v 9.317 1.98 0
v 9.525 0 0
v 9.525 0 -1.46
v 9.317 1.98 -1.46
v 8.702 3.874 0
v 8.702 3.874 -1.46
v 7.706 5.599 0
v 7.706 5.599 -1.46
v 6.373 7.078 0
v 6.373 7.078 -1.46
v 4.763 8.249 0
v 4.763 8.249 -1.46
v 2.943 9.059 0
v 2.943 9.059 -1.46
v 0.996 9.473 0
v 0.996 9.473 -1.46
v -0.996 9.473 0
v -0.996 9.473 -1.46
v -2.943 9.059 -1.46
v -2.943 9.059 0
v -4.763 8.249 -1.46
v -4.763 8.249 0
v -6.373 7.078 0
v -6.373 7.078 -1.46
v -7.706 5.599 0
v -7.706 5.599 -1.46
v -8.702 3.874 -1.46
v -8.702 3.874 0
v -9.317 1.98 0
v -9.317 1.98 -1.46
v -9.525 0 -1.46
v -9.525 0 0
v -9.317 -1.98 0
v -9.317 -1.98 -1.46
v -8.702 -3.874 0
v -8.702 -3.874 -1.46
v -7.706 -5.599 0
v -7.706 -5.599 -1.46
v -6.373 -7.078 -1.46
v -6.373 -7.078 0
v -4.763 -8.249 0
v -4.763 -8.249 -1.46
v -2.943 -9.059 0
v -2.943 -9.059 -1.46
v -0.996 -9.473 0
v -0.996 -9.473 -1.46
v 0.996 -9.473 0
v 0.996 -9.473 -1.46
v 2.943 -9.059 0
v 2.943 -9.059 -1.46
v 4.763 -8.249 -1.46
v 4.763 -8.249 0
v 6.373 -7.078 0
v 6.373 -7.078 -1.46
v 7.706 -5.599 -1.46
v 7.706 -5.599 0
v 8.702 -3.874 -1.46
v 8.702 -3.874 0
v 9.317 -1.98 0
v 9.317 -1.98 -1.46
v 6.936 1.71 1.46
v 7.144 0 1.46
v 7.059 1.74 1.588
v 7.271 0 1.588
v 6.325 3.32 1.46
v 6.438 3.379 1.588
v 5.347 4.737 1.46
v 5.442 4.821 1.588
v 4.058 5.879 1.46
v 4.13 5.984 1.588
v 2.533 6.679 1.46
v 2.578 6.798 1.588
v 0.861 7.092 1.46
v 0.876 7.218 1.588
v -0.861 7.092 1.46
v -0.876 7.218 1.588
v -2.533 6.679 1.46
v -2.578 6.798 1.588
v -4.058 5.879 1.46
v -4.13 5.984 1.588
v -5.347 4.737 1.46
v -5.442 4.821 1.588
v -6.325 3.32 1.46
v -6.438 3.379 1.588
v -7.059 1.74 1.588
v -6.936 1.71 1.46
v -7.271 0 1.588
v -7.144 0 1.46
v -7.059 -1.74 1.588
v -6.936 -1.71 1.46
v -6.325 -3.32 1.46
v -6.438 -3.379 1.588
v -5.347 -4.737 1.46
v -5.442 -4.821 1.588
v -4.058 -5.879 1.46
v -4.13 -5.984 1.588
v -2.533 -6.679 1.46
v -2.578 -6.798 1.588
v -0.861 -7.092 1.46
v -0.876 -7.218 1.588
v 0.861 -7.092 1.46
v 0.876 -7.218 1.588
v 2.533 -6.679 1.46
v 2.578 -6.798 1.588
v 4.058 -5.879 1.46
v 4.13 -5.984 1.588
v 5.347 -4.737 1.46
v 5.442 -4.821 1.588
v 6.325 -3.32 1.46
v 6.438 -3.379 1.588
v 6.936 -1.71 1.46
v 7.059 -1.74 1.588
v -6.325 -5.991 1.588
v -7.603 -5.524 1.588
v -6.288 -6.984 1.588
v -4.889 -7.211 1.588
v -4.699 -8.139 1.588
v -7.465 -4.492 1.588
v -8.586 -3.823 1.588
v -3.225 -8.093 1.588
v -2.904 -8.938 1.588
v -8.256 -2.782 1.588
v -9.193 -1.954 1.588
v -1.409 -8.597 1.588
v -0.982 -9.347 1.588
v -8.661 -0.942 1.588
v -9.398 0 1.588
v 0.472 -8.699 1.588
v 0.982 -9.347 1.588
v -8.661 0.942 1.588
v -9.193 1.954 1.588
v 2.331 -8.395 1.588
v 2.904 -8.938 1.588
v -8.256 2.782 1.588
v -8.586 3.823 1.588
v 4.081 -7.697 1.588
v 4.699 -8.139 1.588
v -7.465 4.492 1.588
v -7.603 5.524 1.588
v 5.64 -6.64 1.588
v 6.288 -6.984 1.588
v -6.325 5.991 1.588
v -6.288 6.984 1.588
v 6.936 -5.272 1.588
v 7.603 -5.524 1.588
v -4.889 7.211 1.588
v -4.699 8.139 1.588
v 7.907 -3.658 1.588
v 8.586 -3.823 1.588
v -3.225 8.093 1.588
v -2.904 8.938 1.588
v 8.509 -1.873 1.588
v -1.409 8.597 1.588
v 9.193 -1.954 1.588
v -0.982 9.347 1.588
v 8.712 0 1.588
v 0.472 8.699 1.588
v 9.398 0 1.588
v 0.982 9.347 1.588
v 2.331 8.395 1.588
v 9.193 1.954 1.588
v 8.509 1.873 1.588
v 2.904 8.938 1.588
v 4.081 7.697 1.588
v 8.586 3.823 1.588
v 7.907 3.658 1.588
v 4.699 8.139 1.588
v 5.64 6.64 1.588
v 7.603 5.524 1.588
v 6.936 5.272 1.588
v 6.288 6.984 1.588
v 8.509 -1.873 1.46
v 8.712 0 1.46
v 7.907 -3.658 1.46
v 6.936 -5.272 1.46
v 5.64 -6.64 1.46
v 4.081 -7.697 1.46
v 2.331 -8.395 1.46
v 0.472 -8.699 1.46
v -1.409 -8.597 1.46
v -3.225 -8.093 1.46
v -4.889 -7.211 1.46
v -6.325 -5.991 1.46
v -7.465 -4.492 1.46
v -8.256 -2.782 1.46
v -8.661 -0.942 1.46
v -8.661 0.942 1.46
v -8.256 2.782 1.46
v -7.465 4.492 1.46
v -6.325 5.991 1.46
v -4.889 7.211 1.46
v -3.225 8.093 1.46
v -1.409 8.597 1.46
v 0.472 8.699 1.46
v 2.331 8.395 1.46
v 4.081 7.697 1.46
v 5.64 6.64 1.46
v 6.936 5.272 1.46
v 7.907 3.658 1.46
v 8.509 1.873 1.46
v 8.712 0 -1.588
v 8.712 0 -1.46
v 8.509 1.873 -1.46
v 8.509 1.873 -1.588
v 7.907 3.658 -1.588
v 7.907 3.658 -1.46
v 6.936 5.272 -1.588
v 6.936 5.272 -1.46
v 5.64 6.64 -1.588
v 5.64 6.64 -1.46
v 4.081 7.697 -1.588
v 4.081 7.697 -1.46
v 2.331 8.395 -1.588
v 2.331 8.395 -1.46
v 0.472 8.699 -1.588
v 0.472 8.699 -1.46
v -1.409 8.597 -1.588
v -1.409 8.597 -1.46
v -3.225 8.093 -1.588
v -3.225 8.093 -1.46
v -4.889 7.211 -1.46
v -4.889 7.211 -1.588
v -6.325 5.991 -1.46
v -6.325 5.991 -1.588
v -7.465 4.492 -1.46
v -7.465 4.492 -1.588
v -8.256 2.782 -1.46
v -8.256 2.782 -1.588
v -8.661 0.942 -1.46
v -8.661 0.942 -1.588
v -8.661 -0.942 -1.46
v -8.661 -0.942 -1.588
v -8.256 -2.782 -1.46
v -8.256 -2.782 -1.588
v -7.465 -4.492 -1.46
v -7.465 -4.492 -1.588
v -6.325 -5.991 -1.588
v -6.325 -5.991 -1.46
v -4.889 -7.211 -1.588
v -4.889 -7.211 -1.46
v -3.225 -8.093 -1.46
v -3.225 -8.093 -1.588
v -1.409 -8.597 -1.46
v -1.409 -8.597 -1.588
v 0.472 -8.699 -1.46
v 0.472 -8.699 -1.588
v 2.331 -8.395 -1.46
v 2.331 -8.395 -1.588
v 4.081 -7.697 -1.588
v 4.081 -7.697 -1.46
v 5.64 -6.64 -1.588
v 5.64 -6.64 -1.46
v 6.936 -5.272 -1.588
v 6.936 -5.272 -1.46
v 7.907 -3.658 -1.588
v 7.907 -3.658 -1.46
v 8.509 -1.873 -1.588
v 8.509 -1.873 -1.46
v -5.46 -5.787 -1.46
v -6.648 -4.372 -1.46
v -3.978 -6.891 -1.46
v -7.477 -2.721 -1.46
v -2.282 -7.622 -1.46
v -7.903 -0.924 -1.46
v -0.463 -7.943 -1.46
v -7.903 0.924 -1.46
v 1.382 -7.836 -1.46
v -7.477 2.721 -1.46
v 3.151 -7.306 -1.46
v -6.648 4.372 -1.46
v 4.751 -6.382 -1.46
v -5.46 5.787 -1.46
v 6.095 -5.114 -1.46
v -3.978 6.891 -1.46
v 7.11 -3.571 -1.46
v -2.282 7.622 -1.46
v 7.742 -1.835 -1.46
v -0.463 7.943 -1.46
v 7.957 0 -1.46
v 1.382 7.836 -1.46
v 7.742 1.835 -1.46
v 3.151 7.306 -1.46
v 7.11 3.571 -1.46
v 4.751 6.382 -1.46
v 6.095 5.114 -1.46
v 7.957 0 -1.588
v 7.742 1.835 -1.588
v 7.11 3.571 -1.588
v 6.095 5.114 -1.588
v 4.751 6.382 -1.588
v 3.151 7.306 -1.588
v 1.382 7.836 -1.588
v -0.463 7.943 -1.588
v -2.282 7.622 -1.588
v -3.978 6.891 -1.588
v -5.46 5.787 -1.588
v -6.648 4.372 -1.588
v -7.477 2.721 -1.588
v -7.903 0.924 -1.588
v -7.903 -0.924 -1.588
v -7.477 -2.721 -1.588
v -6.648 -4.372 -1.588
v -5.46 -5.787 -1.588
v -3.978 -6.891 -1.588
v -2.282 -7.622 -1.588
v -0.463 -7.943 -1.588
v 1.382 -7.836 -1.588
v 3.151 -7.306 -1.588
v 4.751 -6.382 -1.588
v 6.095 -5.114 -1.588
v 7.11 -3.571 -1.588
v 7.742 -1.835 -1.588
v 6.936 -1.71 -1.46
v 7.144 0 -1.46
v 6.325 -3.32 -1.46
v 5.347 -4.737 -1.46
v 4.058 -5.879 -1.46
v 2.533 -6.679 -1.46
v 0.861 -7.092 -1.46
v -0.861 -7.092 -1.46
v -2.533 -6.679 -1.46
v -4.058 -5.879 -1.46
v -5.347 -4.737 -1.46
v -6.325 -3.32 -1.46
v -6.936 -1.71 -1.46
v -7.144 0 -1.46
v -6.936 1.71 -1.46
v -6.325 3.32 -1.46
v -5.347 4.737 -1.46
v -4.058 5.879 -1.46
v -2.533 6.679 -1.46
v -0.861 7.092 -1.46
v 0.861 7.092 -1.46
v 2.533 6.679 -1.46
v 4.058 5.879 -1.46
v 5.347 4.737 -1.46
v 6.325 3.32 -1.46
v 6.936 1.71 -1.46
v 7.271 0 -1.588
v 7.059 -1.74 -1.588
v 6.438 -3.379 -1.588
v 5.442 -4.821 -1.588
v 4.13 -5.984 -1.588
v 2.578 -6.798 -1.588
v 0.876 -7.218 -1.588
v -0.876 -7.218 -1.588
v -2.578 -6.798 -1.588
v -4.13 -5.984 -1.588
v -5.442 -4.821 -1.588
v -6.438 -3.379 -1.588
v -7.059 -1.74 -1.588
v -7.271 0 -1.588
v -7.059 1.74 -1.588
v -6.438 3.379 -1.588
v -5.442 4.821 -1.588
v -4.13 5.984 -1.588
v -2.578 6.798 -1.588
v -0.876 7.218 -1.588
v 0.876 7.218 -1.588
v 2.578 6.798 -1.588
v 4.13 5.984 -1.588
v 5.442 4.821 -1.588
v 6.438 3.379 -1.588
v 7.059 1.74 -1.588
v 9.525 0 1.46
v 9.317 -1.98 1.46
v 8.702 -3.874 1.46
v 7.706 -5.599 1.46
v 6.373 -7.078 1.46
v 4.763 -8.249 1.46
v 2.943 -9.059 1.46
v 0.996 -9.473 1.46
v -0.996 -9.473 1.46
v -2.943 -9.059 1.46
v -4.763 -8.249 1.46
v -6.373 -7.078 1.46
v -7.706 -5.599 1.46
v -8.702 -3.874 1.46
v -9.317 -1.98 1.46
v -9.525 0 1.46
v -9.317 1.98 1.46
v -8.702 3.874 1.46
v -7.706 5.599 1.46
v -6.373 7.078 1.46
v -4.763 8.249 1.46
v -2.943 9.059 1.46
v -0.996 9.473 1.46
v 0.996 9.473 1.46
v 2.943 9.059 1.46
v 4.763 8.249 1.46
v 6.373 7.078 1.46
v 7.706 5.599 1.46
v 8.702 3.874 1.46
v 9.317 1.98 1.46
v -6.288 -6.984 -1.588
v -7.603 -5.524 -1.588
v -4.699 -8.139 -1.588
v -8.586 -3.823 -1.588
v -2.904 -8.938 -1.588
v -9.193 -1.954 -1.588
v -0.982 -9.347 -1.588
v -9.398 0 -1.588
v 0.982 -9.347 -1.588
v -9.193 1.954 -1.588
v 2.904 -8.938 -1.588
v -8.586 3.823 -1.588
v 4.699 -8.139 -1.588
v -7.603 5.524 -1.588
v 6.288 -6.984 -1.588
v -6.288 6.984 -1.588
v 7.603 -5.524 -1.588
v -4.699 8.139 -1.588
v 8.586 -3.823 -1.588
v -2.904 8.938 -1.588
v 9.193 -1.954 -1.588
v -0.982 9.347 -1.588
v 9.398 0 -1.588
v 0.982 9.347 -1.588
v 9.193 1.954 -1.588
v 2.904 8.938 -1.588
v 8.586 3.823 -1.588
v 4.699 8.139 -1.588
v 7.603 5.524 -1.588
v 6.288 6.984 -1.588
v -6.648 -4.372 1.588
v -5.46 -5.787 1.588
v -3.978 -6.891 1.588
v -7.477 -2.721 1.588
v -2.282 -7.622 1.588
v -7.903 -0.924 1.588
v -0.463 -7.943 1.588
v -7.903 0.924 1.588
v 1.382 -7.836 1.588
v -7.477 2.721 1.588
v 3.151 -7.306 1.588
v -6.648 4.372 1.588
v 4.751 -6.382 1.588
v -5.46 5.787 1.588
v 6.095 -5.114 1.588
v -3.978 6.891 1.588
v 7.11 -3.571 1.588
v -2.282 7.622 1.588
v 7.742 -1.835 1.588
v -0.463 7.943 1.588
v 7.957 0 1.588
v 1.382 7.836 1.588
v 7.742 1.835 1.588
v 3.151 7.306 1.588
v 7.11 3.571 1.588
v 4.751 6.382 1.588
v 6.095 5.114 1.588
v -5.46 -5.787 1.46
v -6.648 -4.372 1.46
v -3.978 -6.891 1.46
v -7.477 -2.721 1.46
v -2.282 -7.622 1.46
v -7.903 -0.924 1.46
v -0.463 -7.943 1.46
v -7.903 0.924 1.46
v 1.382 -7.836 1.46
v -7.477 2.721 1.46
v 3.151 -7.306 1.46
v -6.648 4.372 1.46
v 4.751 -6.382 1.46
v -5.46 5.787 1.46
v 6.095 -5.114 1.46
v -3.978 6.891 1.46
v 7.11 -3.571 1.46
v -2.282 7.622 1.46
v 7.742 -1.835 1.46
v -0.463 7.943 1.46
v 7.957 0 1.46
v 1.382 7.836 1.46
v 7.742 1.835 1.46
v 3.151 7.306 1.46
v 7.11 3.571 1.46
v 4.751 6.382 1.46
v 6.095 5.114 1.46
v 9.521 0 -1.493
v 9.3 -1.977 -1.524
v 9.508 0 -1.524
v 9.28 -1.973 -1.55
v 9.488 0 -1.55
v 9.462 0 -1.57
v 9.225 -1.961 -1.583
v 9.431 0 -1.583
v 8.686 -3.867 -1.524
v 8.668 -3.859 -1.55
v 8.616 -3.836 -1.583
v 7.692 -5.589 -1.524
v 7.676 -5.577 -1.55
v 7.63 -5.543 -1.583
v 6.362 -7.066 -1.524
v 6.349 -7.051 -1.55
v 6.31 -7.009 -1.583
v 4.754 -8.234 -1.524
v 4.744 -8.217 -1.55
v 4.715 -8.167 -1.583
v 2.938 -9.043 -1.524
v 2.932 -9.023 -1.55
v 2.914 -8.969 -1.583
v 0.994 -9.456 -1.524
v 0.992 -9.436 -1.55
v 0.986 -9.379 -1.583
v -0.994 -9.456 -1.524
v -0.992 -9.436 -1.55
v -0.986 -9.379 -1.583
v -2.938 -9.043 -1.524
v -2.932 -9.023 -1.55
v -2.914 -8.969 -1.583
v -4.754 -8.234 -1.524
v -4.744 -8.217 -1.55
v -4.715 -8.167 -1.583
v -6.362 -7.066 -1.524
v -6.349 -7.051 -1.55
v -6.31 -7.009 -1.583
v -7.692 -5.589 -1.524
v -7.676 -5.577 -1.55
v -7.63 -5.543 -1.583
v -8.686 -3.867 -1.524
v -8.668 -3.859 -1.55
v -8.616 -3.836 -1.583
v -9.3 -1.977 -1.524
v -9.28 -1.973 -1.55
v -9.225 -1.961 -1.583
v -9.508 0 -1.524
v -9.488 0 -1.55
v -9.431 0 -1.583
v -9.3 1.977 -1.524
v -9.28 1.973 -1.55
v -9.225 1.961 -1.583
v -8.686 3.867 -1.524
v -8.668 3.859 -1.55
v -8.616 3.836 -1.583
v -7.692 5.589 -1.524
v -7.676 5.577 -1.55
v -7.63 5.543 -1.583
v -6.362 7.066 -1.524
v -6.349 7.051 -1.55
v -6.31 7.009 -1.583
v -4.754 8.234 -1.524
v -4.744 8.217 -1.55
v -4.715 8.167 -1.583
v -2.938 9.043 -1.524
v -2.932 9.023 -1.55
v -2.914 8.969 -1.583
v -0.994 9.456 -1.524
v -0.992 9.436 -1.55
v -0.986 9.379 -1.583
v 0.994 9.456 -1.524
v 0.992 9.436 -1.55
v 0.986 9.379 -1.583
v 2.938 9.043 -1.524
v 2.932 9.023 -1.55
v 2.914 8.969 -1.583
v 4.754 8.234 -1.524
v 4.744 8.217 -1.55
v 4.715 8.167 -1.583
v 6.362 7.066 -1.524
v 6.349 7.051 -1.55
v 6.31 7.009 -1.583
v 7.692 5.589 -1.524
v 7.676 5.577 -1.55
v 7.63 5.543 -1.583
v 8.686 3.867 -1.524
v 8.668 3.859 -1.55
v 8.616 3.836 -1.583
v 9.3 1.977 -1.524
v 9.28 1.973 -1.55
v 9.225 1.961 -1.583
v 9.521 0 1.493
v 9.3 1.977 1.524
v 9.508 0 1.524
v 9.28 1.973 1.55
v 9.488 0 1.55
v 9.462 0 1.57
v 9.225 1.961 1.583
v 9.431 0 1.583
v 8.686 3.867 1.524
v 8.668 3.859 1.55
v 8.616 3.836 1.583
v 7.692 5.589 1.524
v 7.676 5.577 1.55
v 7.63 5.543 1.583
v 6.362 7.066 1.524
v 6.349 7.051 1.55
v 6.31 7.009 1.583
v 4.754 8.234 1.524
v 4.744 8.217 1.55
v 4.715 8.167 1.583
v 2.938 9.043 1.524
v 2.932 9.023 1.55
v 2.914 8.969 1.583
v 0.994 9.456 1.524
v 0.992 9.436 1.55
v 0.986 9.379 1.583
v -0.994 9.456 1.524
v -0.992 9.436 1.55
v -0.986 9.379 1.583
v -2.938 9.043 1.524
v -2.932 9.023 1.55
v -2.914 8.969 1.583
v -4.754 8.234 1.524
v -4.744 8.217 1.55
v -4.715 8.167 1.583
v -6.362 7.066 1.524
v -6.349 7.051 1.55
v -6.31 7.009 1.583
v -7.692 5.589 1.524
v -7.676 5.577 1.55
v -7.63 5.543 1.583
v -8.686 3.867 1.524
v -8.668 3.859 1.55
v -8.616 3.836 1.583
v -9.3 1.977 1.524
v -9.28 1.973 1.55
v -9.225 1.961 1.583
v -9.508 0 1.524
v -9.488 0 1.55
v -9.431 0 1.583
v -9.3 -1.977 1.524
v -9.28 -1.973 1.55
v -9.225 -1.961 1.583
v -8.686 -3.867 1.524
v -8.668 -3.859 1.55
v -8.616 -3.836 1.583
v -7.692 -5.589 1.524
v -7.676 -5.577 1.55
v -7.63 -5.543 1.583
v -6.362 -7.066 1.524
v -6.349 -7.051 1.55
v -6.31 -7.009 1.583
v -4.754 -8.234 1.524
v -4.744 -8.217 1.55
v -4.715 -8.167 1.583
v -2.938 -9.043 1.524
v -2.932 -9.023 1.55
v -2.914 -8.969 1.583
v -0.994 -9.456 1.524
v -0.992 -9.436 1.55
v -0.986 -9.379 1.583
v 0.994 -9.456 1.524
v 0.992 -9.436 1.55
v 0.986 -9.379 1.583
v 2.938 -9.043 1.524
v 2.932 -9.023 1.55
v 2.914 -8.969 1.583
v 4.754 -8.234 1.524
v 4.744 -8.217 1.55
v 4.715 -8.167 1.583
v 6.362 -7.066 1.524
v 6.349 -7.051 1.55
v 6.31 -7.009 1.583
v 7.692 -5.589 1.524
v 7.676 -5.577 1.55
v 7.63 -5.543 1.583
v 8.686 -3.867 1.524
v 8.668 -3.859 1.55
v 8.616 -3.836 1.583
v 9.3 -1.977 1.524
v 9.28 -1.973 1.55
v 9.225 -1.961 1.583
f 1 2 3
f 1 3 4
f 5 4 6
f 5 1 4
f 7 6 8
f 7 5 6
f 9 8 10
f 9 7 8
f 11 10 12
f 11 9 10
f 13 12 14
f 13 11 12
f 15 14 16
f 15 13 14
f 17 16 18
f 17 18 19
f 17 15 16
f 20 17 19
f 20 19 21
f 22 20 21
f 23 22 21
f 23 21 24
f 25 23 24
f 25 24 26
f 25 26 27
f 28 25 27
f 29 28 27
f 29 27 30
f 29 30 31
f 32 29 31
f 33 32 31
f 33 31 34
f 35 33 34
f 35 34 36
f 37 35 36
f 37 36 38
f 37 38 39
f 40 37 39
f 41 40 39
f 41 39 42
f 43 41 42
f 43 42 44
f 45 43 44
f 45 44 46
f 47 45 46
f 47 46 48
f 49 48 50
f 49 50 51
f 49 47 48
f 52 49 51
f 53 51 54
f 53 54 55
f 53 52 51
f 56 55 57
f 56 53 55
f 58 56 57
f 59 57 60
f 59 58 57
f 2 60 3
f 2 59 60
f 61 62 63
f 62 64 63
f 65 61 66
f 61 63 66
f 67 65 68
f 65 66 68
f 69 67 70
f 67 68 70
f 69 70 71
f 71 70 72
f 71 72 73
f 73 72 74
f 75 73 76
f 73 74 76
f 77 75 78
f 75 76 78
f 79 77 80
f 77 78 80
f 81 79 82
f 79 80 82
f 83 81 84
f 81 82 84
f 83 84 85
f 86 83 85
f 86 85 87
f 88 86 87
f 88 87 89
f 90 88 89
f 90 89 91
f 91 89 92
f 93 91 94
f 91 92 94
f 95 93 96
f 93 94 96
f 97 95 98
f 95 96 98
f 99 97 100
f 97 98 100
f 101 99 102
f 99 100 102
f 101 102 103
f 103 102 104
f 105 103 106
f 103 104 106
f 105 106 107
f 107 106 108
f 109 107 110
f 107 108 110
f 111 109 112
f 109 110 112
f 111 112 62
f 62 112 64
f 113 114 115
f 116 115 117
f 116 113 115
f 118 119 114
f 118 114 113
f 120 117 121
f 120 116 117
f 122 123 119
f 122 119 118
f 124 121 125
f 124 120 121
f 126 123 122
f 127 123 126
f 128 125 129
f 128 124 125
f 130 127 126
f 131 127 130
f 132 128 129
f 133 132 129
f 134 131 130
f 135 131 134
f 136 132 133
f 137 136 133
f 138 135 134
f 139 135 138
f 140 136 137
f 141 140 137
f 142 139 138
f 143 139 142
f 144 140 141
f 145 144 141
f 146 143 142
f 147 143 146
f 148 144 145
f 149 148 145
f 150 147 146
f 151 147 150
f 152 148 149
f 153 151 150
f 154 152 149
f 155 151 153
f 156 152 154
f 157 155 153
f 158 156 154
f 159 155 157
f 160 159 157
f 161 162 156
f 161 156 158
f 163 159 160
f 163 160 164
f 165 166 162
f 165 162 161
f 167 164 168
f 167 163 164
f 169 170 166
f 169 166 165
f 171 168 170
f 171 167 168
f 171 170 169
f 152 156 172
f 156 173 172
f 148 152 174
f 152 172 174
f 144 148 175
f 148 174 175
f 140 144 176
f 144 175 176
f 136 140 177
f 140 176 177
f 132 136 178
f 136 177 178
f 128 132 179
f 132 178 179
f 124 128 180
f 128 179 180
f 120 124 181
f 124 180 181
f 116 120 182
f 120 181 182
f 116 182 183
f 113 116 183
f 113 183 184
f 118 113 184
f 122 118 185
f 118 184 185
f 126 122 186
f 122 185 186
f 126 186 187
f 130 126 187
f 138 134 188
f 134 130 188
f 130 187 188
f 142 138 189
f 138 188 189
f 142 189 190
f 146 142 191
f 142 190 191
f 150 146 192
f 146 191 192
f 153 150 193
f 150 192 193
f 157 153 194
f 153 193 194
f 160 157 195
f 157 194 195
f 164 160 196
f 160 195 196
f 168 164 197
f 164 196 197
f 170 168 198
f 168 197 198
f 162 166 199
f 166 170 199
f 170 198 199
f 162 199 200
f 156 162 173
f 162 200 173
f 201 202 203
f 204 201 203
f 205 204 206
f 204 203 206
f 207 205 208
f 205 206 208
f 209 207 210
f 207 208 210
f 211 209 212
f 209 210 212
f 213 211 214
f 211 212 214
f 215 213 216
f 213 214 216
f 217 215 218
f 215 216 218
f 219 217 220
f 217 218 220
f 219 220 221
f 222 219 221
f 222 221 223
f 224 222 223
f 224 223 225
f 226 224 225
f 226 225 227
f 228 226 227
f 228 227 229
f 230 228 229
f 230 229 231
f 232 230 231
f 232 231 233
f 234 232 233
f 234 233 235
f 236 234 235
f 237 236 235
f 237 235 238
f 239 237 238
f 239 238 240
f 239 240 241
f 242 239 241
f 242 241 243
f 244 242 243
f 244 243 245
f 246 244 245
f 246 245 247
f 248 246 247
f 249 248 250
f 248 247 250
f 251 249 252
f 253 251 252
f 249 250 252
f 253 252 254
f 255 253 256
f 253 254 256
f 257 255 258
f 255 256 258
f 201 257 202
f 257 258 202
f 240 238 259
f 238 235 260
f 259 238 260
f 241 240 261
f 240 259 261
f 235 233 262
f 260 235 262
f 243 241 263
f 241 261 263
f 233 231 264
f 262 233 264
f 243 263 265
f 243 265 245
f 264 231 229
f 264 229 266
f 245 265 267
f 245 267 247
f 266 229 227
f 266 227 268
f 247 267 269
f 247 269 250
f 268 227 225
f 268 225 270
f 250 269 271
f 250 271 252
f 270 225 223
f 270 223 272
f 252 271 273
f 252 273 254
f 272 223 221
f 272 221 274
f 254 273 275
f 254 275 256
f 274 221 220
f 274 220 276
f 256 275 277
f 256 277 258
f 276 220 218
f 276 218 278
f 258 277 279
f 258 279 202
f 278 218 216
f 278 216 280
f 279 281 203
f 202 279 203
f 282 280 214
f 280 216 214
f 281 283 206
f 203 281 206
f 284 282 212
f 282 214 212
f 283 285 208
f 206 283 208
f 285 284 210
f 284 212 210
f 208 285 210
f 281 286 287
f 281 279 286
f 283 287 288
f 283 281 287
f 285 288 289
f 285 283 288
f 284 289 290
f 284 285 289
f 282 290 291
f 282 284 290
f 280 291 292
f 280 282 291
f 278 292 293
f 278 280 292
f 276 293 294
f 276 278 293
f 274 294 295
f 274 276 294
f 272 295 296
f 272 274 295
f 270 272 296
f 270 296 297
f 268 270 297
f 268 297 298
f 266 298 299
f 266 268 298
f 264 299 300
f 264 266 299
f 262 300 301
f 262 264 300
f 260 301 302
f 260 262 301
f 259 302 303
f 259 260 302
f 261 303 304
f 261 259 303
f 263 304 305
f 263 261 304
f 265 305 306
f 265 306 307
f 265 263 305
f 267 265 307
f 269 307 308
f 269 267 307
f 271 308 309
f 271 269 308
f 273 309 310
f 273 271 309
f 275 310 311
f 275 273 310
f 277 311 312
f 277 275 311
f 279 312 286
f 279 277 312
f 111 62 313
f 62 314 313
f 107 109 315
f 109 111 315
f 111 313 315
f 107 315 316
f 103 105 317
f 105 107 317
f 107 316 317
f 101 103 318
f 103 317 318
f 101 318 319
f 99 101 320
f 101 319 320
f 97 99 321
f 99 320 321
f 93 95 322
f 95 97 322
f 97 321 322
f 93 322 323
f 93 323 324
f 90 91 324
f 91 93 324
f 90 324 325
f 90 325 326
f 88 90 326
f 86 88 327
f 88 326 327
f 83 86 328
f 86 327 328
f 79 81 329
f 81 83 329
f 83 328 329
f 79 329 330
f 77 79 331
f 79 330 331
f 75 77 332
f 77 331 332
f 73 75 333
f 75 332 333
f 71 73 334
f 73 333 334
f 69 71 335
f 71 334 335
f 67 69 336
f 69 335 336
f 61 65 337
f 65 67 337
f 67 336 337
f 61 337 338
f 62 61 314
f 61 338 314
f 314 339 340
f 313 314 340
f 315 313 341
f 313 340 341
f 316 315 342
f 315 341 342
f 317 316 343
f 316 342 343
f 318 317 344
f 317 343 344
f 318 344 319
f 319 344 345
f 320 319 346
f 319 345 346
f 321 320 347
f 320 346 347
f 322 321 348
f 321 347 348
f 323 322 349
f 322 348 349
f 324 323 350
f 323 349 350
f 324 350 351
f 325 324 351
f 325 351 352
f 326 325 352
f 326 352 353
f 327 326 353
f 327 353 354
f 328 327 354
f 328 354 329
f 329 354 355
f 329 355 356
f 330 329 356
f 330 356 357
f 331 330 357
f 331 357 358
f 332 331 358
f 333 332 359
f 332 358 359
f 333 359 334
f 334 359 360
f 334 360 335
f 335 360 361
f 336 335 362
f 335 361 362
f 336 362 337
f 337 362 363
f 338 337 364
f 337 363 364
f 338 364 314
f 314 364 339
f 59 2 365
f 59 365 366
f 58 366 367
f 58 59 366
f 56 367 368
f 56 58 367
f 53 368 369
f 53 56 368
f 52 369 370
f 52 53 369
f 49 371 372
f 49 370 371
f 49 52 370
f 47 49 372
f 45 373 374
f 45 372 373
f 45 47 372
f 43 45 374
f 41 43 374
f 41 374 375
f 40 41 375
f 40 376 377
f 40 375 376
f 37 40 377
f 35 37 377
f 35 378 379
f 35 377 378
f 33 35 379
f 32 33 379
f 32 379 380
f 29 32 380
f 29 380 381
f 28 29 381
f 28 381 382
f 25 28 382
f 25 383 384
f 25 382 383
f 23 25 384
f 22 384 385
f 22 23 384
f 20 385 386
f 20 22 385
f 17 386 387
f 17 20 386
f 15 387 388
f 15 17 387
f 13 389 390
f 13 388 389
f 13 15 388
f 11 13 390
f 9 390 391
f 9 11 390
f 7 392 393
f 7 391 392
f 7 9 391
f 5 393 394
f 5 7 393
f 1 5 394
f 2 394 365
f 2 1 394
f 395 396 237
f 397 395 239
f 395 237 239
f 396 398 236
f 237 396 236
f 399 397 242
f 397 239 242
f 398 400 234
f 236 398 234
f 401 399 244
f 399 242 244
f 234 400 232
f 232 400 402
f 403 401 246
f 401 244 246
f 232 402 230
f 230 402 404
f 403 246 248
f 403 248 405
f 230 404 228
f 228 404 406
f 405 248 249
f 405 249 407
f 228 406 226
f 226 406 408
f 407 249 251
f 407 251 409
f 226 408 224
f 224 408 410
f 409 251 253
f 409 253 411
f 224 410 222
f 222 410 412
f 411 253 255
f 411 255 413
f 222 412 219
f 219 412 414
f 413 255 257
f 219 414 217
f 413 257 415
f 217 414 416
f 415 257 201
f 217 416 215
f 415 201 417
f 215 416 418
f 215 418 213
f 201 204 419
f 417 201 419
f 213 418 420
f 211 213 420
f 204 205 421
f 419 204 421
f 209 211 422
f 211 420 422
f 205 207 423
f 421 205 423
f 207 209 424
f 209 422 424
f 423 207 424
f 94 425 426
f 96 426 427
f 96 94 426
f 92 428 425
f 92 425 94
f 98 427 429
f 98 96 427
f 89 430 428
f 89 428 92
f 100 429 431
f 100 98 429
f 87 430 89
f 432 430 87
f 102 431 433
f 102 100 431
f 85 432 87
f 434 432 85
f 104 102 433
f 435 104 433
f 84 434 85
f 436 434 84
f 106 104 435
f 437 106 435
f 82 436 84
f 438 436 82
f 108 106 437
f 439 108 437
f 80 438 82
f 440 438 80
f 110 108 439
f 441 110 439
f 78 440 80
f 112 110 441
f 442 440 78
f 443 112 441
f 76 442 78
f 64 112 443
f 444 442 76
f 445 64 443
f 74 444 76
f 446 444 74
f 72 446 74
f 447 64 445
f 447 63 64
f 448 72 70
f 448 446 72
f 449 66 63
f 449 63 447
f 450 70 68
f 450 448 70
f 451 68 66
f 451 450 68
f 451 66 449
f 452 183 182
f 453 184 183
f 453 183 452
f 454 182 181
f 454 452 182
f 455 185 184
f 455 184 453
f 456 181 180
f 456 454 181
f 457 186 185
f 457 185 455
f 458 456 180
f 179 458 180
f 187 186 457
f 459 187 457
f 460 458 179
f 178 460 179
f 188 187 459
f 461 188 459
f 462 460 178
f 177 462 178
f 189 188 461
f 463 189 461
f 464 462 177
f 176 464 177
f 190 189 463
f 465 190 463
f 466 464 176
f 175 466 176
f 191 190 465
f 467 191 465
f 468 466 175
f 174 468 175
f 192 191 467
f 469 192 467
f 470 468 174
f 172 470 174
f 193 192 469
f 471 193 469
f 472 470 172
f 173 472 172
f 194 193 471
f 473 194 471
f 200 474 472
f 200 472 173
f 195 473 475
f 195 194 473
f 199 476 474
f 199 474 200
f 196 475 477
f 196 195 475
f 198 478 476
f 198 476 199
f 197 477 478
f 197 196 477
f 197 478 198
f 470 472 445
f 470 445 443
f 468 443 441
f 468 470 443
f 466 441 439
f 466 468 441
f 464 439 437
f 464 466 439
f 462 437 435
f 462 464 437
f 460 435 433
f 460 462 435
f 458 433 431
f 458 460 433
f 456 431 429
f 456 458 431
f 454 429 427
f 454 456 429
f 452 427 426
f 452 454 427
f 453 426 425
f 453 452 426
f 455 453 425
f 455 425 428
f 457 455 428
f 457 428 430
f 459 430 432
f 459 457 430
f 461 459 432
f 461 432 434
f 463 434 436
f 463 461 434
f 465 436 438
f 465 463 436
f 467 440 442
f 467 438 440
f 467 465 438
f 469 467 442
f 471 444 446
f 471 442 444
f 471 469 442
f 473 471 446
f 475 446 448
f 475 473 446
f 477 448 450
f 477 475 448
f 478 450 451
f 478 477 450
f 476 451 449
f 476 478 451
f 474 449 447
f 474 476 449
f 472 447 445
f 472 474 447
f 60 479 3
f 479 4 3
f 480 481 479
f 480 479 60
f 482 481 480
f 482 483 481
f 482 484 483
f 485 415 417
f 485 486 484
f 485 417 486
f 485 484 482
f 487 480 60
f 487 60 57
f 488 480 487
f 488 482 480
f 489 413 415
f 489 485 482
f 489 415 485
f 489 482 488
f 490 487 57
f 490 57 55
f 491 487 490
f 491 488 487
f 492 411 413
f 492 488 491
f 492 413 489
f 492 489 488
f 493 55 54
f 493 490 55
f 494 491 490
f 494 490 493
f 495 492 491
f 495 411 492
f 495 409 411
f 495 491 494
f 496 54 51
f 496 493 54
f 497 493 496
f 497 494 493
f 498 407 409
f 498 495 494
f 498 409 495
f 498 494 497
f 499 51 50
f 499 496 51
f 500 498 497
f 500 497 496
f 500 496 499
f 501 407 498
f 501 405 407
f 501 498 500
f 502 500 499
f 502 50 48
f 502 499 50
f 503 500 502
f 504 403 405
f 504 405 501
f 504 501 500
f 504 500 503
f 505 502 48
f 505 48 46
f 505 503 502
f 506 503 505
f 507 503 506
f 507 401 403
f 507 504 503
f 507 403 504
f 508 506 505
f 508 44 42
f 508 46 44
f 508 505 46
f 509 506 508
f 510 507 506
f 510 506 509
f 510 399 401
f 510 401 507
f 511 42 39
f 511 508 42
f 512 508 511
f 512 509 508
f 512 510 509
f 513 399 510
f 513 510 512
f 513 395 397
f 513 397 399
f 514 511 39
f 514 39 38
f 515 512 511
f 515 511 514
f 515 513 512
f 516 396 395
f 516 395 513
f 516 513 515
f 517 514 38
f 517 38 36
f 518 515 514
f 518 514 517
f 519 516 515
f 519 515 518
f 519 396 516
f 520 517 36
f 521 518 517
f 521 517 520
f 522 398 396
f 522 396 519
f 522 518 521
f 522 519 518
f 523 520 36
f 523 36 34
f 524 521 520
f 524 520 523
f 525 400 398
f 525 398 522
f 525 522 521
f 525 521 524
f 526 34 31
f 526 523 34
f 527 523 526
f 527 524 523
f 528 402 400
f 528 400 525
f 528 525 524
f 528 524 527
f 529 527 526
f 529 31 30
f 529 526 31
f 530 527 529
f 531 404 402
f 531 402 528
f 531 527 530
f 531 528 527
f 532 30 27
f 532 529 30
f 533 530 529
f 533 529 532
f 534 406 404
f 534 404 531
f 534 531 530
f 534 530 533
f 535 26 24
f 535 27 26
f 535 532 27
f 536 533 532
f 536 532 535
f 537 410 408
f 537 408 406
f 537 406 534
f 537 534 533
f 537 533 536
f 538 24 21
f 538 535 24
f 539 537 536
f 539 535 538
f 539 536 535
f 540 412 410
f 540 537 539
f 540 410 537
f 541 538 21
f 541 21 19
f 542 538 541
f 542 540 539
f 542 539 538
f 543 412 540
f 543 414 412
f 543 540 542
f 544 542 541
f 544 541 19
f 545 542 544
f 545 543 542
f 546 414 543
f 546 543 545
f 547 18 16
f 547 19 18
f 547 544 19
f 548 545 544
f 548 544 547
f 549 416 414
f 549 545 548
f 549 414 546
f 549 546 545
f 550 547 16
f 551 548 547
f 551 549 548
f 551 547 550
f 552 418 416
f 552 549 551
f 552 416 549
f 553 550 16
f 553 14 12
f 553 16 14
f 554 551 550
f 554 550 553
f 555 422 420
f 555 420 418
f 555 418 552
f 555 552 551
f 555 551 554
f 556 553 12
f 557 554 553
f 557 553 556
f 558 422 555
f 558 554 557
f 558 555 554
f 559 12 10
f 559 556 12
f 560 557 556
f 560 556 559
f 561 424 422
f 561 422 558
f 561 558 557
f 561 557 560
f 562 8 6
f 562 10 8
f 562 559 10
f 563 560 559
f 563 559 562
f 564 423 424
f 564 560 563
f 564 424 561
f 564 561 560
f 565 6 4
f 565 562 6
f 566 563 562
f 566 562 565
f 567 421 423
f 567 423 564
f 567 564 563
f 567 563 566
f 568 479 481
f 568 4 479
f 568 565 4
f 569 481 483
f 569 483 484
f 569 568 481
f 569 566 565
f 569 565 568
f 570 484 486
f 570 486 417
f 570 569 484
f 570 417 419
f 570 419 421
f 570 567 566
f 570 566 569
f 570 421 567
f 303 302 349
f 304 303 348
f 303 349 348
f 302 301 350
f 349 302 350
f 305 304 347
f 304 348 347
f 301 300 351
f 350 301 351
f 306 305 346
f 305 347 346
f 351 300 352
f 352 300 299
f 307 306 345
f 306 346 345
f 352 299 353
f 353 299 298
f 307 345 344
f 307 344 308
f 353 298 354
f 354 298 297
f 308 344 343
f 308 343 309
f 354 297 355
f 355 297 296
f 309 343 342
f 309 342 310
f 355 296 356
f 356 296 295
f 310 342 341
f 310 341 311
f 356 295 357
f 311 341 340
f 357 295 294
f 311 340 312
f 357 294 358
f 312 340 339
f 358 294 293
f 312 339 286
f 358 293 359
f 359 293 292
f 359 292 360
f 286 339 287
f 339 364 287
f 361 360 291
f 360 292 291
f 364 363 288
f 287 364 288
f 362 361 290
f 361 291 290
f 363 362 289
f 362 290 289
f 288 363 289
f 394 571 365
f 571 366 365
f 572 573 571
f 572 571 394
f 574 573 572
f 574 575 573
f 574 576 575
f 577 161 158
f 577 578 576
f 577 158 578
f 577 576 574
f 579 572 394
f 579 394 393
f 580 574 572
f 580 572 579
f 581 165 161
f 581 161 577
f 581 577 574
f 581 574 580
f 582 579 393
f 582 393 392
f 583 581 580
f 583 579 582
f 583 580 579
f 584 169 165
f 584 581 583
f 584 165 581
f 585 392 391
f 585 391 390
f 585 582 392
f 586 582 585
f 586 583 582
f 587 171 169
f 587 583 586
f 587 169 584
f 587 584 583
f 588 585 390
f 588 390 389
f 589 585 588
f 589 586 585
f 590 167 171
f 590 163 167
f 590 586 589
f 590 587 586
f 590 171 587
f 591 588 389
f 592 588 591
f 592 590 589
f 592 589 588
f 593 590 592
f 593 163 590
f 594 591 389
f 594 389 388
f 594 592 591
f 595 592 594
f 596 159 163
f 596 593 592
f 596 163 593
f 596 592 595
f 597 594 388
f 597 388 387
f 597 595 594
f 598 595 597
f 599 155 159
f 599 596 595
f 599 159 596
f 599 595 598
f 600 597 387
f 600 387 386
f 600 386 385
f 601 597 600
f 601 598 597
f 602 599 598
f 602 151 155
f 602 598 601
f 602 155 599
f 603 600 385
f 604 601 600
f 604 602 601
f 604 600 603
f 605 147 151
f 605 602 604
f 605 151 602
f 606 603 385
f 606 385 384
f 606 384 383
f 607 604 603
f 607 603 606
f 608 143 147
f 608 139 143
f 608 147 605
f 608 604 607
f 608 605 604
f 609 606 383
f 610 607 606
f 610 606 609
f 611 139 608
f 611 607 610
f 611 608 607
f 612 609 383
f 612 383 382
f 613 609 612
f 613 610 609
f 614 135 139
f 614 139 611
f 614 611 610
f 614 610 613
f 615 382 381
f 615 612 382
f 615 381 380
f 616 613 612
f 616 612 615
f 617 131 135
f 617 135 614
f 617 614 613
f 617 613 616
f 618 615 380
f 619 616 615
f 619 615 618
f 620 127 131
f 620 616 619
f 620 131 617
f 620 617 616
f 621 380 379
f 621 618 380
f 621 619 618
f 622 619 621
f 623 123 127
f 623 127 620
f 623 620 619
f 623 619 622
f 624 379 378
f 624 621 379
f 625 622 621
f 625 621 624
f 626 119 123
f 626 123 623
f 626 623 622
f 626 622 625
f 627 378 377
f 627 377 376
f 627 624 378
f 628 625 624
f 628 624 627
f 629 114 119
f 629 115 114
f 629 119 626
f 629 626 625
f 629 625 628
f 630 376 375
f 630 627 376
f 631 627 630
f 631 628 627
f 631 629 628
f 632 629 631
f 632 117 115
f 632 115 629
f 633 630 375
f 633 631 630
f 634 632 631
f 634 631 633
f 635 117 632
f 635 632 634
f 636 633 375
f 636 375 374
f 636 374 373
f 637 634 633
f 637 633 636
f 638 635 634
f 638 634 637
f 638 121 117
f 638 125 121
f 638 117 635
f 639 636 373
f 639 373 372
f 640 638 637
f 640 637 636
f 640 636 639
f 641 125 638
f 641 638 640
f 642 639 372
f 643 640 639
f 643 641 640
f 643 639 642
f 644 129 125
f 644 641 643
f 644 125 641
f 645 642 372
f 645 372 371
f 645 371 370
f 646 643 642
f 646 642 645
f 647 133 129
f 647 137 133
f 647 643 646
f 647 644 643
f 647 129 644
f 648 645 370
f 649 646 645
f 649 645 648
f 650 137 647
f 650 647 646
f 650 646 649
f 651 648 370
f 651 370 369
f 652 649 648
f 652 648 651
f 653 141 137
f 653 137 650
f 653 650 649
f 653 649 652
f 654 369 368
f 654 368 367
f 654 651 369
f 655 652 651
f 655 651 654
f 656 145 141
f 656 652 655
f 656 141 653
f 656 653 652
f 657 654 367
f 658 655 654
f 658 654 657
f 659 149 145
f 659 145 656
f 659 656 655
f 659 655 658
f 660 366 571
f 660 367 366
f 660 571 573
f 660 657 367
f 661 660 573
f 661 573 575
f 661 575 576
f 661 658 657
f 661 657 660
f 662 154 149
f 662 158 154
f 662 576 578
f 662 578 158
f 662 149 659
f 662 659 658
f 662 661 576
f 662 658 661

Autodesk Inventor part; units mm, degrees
ref_plane "YZ Plane" through (0, 0, 0) normal (1, 0, 0) x (0, 1, 0)
ref_plane "XZ Plane" through (0, 0, 0) normal (0, 1, 0) x (-1, 0, 0)
ref_plane "XY Plane" through (0, 0, 0) normal (0, 0, 1) x (1, 0, 0)
sketch "Sketch1" plane through (0, 0, 0) normal (0, 0, 1) x (1, 0, 0)
  circle A0 centre (0, 0) radius 7.1437
  circle A1 centre (0, 0) radius 7.9566
  circle A2 centre (0, 0) radius 9.525
  circle A3 centre (0, 0) radius 8.7122
  dimension "d0" = 14.2875
  dimension "d1" = 0.8128
  dimension "d2" = 19.05
  dimension "d3" = 0.8128
extrude "Extrusion1" add sketch "Sketch1" along normal mid plane 3.175
fillet "Fillet1" radius 0.127 2 edges at (-9.525, 0, 1.5875) (-9.525, 0, -1.5875)
chamfer "Chamfer1" distance 0.127 angle 45 2 edges at (-7.1437, 0, 1.5875) (-7.1437, 0, -1.5875)
extrude "Extrusion2" add sketch "Sketch1" along normal mid plane 2.921 contours A3
properties part number "Front Hub Bearing"
